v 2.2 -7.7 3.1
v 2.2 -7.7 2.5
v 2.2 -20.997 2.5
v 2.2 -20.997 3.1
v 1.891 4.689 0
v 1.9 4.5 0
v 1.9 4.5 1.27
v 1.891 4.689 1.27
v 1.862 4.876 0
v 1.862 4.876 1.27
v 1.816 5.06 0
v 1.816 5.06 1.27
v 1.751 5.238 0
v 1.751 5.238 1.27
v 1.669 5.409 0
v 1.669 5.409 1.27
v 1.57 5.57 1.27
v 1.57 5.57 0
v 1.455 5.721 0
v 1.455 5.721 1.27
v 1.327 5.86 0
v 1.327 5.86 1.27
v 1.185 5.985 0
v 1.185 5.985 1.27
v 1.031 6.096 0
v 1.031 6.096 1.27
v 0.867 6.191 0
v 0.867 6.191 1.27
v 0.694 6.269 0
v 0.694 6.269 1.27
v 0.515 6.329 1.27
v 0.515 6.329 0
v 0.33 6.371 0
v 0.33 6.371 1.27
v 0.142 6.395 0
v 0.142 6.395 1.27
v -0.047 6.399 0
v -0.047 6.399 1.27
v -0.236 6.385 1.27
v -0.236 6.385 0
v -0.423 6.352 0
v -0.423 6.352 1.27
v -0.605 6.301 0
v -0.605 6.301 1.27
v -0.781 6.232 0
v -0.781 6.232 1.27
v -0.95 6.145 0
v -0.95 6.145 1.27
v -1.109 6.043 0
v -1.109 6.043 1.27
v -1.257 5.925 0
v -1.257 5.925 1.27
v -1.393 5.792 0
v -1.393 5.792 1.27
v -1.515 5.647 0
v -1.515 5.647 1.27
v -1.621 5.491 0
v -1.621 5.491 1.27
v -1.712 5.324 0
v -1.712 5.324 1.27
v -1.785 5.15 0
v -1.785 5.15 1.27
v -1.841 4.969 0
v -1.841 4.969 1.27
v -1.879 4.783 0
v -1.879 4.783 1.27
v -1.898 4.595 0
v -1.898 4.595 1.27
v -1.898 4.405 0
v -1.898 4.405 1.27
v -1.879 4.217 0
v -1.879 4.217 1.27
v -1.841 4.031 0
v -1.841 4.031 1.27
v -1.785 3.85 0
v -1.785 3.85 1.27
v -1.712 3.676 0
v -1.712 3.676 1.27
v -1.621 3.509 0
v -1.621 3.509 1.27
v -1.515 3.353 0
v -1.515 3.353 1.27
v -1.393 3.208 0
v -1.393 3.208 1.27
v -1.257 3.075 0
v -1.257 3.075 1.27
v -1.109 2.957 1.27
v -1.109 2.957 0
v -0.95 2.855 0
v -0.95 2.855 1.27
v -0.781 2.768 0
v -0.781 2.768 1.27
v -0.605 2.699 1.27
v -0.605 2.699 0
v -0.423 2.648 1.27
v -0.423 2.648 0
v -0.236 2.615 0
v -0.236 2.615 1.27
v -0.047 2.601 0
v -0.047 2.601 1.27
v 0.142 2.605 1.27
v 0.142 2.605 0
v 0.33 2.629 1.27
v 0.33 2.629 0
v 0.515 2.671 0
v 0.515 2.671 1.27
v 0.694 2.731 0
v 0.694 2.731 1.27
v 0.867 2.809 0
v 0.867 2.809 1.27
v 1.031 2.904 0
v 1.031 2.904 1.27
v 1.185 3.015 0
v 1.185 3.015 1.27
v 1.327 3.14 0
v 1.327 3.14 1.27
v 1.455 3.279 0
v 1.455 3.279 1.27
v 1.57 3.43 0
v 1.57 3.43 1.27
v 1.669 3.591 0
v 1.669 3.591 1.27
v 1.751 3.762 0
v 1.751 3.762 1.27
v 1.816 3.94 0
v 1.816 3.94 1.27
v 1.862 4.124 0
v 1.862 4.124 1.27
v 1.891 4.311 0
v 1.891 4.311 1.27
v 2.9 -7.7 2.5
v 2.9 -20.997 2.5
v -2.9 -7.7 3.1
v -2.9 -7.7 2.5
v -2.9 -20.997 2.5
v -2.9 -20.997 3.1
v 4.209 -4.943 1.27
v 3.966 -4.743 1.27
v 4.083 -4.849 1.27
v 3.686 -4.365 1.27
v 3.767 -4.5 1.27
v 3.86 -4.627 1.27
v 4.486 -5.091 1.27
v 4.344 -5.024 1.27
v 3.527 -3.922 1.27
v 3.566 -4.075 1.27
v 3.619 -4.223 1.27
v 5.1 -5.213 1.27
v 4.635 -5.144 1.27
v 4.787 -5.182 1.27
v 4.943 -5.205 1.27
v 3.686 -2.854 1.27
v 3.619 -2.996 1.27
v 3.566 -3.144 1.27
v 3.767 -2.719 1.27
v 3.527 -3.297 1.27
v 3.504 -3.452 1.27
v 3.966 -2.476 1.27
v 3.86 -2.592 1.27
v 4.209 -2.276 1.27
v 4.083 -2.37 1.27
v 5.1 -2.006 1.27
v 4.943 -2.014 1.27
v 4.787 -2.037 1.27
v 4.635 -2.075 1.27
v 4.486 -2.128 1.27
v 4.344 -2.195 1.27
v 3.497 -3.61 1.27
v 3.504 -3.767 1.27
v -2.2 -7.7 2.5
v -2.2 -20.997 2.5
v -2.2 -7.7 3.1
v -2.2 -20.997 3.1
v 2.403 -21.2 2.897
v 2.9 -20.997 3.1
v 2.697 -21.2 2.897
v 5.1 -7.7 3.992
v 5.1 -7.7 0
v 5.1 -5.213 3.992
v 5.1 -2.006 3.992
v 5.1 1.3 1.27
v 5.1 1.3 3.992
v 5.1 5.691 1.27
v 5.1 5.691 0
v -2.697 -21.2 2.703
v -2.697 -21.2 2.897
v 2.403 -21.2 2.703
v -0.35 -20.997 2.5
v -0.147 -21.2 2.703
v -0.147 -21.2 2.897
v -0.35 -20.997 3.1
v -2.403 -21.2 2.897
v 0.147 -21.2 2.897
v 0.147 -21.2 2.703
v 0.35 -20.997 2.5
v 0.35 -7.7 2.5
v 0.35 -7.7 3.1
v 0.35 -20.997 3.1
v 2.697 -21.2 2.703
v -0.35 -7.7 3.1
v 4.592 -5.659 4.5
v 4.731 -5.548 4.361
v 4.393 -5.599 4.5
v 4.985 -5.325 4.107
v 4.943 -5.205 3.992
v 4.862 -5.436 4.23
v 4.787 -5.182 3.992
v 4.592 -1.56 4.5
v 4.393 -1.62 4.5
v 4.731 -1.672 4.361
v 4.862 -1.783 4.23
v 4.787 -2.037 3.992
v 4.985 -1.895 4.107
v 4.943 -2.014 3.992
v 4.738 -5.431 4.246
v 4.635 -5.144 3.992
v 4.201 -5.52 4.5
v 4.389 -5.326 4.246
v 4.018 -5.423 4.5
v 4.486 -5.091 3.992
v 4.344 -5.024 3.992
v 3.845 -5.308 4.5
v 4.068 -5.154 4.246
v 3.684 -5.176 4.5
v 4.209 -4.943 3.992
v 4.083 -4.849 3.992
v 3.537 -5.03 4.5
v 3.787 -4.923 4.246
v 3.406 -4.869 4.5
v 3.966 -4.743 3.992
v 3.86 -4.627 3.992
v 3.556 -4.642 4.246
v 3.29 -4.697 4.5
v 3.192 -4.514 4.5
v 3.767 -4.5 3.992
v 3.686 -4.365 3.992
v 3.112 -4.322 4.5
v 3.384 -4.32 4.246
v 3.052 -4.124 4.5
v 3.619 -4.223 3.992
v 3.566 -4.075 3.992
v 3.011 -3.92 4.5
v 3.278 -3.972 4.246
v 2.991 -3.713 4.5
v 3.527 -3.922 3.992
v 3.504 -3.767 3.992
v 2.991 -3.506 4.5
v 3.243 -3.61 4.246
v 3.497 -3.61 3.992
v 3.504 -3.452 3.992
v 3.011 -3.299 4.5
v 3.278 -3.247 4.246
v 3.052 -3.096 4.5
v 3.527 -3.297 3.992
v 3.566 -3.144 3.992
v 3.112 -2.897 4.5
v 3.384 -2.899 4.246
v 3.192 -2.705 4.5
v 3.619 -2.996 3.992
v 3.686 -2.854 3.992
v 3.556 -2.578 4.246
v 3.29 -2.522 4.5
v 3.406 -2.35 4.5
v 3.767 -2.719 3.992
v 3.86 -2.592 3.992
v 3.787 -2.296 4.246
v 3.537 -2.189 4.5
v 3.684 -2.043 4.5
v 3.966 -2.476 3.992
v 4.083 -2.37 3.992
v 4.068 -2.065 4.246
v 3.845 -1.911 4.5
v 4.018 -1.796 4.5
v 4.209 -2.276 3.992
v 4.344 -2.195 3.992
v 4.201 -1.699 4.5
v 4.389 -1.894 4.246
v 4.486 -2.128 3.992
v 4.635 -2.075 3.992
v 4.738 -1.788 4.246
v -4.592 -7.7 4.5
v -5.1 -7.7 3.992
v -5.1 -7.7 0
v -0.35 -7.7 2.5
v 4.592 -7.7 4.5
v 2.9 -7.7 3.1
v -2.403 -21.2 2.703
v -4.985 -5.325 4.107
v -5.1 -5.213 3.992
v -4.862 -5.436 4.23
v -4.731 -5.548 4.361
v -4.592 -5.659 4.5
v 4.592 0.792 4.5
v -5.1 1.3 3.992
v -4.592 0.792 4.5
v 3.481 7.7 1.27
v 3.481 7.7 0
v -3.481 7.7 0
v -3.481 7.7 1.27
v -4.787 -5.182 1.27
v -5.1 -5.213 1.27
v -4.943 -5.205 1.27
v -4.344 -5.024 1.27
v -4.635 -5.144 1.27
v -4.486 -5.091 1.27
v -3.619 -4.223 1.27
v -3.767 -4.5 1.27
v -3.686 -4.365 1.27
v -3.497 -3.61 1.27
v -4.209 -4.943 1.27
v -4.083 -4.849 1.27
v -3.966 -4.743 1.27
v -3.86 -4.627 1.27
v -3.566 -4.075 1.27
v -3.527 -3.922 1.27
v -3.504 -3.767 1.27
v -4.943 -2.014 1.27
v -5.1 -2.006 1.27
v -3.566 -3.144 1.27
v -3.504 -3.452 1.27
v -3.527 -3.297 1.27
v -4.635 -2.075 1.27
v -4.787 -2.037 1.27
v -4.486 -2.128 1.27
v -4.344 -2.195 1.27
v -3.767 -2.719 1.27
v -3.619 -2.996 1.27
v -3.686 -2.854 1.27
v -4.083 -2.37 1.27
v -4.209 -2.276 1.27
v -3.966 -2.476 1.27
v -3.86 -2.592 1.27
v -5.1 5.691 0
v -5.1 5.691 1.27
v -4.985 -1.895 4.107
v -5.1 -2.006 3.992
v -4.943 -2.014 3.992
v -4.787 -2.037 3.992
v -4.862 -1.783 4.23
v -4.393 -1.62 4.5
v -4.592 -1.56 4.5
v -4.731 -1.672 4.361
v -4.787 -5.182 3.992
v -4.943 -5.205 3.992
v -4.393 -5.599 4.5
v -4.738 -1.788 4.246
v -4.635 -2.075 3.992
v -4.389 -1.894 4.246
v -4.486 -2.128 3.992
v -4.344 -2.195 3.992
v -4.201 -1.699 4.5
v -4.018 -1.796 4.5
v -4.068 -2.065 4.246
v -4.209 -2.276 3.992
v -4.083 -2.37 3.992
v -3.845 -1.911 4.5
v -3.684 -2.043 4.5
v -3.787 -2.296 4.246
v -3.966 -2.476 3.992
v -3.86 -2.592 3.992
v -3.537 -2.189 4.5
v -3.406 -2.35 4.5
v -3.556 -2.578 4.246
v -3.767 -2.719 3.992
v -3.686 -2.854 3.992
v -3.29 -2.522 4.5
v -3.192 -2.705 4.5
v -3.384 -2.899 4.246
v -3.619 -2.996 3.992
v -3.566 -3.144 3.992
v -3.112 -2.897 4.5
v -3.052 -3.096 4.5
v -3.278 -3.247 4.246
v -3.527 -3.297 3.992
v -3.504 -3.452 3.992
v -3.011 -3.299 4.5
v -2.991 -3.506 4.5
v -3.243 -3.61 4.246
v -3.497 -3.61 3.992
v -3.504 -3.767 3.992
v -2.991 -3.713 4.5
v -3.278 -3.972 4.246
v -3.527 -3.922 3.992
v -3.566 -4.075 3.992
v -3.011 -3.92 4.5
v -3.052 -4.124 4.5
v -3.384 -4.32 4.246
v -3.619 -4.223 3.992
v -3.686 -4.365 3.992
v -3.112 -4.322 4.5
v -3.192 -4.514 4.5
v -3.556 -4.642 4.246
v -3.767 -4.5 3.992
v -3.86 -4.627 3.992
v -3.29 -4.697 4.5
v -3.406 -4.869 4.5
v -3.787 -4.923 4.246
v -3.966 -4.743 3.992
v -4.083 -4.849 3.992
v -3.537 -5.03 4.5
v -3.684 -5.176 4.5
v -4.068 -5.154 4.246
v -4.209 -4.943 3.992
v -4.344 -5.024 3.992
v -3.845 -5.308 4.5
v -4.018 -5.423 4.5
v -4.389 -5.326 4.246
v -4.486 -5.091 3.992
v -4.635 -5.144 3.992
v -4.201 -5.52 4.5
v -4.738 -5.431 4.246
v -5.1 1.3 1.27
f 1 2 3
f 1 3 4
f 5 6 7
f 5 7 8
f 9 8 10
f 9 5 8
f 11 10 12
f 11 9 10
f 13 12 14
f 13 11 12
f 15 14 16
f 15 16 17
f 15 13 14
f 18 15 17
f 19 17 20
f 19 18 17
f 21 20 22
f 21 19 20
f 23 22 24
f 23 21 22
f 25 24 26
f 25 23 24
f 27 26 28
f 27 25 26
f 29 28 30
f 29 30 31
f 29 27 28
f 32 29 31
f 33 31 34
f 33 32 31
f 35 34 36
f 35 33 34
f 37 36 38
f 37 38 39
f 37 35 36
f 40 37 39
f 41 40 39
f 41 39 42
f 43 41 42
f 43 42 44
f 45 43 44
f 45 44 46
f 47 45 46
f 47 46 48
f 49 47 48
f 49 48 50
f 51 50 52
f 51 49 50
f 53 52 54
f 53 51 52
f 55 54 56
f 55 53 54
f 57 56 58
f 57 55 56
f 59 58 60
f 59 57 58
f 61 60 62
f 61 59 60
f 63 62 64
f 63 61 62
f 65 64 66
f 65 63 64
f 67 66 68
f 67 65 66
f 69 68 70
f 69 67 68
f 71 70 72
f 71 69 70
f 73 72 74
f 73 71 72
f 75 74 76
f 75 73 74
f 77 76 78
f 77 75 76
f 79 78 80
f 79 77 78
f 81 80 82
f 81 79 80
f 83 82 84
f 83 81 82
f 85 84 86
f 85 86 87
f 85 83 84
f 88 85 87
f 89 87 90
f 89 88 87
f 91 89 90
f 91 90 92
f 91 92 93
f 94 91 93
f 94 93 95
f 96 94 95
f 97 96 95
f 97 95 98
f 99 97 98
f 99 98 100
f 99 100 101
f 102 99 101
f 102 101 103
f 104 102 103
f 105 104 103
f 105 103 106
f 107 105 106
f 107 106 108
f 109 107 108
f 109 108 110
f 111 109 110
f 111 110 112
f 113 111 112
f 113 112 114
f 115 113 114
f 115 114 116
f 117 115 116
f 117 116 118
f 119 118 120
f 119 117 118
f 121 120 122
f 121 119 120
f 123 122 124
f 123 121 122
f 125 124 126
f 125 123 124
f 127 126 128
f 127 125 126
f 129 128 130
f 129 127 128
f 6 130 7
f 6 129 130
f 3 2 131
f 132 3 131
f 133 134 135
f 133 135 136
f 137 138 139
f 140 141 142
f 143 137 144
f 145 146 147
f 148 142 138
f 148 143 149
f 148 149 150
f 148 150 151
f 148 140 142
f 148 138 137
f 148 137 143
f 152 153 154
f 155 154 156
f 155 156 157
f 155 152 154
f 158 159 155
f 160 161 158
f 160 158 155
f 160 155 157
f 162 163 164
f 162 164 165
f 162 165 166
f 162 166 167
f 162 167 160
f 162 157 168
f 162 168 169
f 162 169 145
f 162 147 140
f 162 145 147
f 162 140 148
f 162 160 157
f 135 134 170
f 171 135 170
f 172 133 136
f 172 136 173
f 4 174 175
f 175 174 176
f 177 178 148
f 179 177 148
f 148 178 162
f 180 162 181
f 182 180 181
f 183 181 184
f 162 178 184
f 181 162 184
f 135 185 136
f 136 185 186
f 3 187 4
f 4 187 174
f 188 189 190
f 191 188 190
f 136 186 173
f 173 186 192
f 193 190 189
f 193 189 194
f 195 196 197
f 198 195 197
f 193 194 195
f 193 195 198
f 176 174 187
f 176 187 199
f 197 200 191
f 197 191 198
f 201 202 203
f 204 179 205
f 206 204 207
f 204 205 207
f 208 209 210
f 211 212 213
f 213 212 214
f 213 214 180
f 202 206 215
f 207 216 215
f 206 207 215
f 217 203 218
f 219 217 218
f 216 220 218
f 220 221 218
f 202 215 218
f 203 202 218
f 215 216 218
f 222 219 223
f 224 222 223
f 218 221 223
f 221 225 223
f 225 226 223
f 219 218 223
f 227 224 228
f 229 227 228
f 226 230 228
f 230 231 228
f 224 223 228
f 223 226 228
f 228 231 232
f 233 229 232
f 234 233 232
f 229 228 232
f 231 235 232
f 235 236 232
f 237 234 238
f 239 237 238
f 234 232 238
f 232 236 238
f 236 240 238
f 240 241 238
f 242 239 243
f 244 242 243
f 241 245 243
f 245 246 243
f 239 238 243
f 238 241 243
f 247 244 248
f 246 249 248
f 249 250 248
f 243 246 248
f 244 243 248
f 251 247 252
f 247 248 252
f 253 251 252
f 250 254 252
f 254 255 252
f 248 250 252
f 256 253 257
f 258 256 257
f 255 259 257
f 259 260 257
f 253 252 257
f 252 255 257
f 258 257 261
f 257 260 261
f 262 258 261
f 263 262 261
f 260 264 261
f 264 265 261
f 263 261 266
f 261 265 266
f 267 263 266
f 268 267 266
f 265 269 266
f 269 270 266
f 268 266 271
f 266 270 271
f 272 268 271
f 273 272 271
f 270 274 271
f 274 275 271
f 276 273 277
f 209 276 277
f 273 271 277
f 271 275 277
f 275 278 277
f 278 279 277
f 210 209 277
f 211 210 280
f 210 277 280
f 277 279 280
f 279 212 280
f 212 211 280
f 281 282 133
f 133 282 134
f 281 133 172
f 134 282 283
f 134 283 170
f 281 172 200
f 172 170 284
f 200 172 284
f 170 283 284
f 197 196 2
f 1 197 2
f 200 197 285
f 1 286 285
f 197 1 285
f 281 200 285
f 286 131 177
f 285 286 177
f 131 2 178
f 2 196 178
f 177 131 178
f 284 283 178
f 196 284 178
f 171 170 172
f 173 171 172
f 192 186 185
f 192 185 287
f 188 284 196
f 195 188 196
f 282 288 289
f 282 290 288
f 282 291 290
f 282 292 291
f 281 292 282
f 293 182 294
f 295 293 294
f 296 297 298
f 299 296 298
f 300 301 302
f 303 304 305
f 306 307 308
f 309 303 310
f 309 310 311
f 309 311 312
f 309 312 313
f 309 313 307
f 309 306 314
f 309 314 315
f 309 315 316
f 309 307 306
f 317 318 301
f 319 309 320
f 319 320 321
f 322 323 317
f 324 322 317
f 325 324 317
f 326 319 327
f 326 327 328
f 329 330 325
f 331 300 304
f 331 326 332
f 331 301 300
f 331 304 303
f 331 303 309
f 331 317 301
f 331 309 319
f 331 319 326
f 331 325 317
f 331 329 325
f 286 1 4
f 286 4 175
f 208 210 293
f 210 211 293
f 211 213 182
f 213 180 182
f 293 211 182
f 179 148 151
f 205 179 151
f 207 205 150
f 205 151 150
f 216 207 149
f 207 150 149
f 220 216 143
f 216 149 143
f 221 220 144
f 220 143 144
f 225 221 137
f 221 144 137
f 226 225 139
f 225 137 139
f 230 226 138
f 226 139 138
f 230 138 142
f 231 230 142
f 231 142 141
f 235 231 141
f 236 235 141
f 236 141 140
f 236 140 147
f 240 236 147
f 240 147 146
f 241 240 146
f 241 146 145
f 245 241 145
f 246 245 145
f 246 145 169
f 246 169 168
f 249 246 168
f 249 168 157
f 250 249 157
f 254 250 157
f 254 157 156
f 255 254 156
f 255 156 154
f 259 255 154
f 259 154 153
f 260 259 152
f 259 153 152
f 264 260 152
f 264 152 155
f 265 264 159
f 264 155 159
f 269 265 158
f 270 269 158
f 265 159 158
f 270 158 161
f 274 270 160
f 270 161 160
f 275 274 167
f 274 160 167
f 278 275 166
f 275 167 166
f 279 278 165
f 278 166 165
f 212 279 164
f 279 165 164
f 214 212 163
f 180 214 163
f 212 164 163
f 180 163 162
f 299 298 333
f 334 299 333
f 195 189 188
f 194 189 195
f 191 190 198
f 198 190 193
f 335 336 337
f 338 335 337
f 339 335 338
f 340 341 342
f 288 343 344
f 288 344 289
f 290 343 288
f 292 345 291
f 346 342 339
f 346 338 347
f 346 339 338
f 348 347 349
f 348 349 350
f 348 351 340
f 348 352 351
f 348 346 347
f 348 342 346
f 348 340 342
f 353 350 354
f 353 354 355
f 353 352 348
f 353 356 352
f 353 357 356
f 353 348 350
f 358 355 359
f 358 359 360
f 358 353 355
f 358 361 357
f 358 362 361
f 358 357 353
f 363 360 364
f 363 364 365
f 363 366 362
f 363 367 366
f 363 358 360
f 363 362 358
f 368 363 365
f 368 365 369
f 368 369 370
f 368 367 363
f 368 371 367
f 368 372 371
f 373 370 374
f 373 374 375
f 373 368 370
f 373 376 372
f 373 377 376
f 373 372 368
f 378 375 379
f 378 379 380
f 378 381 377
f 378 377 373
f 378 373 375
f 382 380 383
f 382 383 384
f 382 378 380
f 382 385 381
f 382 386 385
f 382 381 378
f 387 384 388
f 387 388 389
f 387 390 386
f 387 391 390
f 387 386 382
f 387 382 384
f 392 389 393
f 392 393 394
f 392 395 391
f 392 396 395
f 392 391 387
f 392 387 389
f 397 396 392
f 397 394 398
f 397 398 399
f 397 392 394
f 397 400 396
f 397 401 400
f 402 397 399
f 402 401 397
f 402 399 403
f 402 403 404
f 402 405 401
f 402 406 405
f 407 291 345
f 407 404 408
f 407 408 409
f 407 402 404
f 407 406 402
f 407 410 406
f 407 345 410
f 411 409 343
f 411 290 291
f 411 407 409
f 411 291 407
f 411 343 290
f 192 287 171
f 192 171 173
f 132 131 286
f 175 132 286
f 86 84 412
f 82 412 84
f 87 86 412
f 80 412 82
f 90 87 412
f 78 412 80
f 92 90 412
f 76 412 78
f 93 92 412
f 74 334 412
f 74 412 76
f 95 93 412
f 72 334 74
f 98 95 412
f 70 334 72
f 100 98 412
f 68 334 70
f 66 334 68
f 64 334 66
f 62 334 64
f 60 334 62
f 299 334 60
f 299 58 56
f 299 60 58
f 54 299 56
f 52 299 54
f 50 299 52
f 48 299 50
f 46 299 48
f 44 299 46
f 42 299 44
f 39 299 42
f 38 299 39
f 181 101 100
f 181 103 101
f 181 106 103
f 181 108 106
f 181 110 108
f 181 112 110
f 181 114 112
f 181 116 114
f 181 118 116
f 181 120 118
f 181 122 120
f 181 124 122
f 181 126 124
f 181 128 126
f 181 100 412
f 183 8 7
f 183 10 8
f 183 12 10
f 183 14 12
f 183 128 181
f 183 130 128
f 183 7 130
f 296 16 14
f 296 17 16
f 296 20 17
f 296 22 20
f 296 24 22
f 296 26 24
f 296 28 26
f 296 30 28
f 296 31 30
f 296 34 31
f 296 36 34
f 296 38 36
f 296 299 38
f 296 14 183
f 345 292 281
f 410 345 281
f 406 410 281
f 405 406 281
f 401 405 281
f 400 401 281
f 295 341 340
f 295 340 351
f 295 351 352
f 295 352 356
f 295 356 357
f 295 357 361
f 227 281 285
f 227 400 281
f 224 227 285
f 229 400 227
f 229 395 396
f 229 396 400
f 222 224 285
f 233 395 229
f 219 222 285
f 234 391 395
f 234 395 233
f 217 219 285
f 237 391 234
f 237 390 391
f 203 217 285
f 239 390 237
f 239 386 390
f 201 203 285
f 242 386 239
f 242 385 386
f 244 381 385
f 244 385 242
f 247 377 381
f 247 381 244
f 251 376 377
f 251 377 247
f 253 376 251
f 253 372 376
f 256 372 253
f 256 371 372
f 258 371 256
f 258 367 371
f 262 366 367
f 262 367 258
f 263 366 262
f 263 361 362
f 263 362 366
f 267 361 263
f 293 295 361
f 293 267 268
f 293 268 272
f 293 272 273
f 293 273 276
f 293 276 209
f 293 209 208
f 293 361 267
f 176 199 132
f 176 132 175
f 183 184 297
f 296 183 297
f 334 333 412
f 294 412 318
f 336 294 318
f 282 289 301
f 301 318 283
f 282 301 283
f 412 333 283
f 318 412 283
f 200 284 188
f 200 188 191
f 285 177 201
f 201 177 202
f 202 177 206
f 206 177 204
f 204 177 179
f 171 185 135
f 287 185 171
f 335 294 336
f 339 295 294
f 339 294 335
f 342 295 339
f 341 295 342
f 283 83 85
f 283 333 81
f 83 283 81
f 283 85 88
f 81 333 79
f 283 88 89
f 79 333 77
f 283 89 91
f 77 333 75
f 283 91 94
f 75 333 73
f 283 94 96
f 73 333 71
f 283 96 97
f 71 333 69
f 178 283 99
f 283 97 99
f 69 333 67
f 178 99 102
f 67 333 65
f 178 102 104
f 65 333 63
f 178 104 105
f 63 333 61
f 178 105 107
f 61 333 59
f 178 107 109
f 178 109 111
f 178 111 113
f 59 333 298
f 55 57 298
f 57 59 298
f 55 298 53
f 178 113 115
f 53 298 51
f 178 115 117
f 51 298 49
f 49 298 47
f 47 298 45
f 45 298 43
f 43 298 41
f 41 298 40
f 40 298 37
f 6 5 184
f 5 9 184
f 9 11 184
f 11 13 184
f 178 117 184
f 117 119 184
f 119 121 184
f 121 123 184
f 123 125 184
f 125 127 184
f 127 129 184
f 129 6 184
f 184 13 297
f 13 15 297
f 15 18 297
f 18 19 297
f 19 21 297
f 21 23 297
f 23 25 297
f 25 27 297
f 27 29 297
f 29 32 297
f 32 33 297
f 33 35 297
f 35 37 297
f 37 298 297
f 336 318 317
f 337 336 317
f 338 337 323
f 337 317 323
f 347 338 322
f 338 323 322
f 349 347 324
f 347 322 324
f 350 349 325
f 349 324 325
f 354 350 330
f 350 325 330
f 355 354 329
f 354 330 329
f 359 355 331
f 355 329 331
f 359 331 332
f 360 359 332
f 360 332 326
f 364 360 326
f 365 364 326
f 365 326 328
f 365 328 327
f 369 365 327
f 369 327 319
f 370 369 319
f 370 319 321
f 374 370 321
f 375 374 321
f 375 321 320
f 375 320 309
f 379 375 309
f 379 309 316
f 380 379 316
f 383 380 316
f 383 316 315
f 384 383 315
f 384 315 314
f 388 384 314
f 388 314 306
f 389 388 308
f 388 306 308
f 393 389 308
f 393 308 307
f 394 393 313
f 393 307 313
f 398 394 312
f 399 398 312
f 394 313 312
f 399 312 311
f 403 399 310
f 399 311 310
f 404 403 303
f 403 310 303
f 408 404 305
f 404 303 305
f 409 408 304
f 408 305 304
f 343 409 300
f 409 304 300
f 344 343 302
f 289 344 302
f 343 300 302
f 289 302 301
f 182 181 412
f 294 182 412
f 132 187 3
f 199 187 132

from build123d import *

# Parameters (mm, degrees)
F1_DEPTH = 4.5
F0_R     = 1.9
F2_DEPTH = 1.27
F3_SIZE  = 0.508
F4_W     = 0.7
F4_H     = 0.6
F5_DEPTH = 13.5
F6_SIZE  = 0.2032


with BuildPart() as f1:
    # F0 (on Top) → F1 (new body)
    with BuildSketch(Plane.XY):
        with BuildLine():
            Line((5.1, -2.006139996), (5.1, 1.3))
            Line((5.1, 1.3), (-5.1, 1.3))
            Line((-5.1, 1.3), (-5.1, -2.006139996))
            ThreePointArc((-5.1, -2.006139996), (-3.4965183315, -3.6096216645), (-5.1, -5.213103333))
            Line((-5.1, -5.213103333), (-5.1, -7.7))
            Line((-5.1, -7.7), (5.1, -7.7))
            Line((5.1, -7.7), (5.1, -5.213103333))
            ThreePointArc((5.1, -5.213103333), (3.4965183315, -3.6096216645), (5.1, -2.006139996))
        make_face()
    extrude(amount=F1_DEPTH)

    # F0 (on Top) → F2 (join)
    with BuildSketch(Plane.XY):
        Polygon((5.1, 5.6912479922), (3.4809927456, 7.7), (-3.4809927456, 7.7), (-5.1, 5.6912479922), (-5.1, 1.3), (5.1, 1.3), align=None)
        with Locations((0, 4.5)):
            Circle(F0_R, mode=Mode.SUBTRACT)
        with BuildLine():
            ThreePointArc((-5.1, -5.213103333), (-3.4965183315, -3.6096216645), (-5.1, -2.006139996))
            Line((-5.1, -2.006139996), (-5.1, -5.213103333))
        make_face()
        with BuildLine():
            Line((5.1, -5.213103333), (5.1, -2.006139996))
            ThreePointArc((5.1, -2.006139996), (3.4965183315, -3.6096216645), (5.1, -5.213103333))
        make_face()
    extrude(amount=F2_DEPTH)

    # F3
    f3_edges = [f1.edges().sort_by_distance(p)[0] for p in [
        (-5.1, -6.456552, 4.5),
        (0, 1.3, 4.5),
        (5.1, -0.35307, 4.5),
        (3.496518, -3.609622, 4.5),
        (-3.496518, -3.609622, 4.5),
        (5.1, -6.456552, 4.5),
        (-5.1, -0.35307, 4.5),
    ]]
    chamfer(f3_edges, length=F3_SIZE)

    # F4 (on face) → F5 (join)
    with BuildSketch(Plane.XZ.offset(7.7)):
        with Locations((-2.55, 2.8)):
            Rectangle(F4_W, F4_H)
        with Locations((0, 2.8)):
            Rectangle(F4_W, F4_H)
        with Locations((2.55, 2.8)):
            Rectangle(F4_W, F4_H)
    extrude(amount=F5_DEPTH)

    # F6
    f6_edges = [f1.edges().sort_by_distance(p)[0] for p in [
        (-2.55, -21.2, 3.1),
        (-2.9, -21.2, 2.8),
        (-2.55, -21.2, 2.5),
        (-2.2, -21.2, 2.8),
        (0, -21.2, 3.1),
        (-0.35, -21.2, 2.8),
        (0, -21.2, 2.5),
        (0.35, -21.2, 2.8),
        (2.55, -21.2, 3.1),
        (2.2, -21.2, 2.8),
        (2.55, -21.2, 2.5),
        (2.9, -21.2, 2.8),
    ]]
    chamfer(f6_edges, length=F6_SIZE)


solid = f1.part
